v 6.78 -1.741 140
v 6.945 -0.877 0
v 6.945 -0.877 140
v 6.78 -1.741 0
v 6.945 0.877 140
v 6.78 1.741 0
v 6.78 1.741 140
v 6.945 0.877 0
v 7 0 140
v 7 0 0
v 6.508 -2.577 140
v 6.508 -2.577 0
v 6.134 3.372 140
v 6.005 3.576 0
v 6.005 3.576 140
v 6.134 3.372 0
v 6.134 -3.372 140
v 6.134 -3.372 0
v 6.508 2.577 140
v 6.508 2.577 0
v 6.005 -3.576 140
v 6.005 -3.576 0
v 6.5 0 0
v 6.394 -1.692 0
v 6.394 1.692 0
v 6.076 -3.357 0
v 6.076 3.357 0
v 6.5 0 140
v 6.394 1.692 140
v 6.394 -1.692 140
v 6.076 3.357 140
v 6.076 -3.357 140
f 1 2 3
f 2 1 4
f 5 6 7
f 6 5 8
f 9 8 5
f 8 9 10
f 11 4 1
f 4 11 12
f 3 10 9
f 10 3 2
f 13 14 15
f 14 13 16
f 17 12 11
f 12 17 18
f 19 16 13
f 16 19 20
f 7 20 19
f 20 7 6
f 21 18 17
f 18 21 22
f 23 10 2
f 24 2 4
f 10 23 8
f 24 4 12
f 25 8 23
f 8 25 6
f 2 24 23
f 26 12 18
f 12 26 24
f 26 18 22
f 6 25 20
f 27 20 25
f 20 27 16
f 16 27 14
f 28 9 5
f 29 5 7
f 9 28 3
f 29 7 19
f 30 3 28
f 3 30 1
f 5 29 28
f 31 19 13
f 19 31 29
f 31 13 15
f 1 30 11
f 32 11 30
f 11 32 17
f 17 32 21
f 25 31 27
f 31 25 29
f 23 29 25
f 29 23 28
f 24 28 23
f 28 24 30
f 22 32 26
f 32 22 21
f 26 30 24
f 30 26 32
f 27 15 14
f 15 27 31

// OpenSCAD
$fn = 50;


difference() {
	union() {
		cylinder(h = 140, r = 7.0000000000);
		translate(v = [-10.0000000000, 0, 0]) {
			cylinder(h = 140, r = 7.0000000000);
		}
	}
	union() {
		cylinder(h = 140, r = 3.2500000000);
		cylinder(h = 140, r = 1.8000000000);
		cylinder(h = 140, r = 1.8000000000);
		cylinder(h = 140, r = 1.8000000000);
		translate(v = [-14.5000000000, 0, 0]) {
			hull() {
				translate(v = [-3.7500000000, 0.0000000000, 0]) {
					cylinder(h = 140, r = 7.5000000000);
				}
				translate(v = [3.7500000000, 0.0000000000, 0]) {
					cylinder(h = 140, r = 7.5000000000);
				}
				translate(v = [-3.7500000000, -0.0000000000, 0]) {
					cylinder(h = 140, r = 7.5000000000);
				}
				translate(v = [3.7500000000, -0.0000000000, 0]) {
					cylinder(h = 140, r = 7.5000000000);
				}
			}
		}
		translate(v = [-7.0000000000, 0, 0.0000000000]) {
			cylinder(h = 140, r = 13.5000000000);
		}
	}
}
